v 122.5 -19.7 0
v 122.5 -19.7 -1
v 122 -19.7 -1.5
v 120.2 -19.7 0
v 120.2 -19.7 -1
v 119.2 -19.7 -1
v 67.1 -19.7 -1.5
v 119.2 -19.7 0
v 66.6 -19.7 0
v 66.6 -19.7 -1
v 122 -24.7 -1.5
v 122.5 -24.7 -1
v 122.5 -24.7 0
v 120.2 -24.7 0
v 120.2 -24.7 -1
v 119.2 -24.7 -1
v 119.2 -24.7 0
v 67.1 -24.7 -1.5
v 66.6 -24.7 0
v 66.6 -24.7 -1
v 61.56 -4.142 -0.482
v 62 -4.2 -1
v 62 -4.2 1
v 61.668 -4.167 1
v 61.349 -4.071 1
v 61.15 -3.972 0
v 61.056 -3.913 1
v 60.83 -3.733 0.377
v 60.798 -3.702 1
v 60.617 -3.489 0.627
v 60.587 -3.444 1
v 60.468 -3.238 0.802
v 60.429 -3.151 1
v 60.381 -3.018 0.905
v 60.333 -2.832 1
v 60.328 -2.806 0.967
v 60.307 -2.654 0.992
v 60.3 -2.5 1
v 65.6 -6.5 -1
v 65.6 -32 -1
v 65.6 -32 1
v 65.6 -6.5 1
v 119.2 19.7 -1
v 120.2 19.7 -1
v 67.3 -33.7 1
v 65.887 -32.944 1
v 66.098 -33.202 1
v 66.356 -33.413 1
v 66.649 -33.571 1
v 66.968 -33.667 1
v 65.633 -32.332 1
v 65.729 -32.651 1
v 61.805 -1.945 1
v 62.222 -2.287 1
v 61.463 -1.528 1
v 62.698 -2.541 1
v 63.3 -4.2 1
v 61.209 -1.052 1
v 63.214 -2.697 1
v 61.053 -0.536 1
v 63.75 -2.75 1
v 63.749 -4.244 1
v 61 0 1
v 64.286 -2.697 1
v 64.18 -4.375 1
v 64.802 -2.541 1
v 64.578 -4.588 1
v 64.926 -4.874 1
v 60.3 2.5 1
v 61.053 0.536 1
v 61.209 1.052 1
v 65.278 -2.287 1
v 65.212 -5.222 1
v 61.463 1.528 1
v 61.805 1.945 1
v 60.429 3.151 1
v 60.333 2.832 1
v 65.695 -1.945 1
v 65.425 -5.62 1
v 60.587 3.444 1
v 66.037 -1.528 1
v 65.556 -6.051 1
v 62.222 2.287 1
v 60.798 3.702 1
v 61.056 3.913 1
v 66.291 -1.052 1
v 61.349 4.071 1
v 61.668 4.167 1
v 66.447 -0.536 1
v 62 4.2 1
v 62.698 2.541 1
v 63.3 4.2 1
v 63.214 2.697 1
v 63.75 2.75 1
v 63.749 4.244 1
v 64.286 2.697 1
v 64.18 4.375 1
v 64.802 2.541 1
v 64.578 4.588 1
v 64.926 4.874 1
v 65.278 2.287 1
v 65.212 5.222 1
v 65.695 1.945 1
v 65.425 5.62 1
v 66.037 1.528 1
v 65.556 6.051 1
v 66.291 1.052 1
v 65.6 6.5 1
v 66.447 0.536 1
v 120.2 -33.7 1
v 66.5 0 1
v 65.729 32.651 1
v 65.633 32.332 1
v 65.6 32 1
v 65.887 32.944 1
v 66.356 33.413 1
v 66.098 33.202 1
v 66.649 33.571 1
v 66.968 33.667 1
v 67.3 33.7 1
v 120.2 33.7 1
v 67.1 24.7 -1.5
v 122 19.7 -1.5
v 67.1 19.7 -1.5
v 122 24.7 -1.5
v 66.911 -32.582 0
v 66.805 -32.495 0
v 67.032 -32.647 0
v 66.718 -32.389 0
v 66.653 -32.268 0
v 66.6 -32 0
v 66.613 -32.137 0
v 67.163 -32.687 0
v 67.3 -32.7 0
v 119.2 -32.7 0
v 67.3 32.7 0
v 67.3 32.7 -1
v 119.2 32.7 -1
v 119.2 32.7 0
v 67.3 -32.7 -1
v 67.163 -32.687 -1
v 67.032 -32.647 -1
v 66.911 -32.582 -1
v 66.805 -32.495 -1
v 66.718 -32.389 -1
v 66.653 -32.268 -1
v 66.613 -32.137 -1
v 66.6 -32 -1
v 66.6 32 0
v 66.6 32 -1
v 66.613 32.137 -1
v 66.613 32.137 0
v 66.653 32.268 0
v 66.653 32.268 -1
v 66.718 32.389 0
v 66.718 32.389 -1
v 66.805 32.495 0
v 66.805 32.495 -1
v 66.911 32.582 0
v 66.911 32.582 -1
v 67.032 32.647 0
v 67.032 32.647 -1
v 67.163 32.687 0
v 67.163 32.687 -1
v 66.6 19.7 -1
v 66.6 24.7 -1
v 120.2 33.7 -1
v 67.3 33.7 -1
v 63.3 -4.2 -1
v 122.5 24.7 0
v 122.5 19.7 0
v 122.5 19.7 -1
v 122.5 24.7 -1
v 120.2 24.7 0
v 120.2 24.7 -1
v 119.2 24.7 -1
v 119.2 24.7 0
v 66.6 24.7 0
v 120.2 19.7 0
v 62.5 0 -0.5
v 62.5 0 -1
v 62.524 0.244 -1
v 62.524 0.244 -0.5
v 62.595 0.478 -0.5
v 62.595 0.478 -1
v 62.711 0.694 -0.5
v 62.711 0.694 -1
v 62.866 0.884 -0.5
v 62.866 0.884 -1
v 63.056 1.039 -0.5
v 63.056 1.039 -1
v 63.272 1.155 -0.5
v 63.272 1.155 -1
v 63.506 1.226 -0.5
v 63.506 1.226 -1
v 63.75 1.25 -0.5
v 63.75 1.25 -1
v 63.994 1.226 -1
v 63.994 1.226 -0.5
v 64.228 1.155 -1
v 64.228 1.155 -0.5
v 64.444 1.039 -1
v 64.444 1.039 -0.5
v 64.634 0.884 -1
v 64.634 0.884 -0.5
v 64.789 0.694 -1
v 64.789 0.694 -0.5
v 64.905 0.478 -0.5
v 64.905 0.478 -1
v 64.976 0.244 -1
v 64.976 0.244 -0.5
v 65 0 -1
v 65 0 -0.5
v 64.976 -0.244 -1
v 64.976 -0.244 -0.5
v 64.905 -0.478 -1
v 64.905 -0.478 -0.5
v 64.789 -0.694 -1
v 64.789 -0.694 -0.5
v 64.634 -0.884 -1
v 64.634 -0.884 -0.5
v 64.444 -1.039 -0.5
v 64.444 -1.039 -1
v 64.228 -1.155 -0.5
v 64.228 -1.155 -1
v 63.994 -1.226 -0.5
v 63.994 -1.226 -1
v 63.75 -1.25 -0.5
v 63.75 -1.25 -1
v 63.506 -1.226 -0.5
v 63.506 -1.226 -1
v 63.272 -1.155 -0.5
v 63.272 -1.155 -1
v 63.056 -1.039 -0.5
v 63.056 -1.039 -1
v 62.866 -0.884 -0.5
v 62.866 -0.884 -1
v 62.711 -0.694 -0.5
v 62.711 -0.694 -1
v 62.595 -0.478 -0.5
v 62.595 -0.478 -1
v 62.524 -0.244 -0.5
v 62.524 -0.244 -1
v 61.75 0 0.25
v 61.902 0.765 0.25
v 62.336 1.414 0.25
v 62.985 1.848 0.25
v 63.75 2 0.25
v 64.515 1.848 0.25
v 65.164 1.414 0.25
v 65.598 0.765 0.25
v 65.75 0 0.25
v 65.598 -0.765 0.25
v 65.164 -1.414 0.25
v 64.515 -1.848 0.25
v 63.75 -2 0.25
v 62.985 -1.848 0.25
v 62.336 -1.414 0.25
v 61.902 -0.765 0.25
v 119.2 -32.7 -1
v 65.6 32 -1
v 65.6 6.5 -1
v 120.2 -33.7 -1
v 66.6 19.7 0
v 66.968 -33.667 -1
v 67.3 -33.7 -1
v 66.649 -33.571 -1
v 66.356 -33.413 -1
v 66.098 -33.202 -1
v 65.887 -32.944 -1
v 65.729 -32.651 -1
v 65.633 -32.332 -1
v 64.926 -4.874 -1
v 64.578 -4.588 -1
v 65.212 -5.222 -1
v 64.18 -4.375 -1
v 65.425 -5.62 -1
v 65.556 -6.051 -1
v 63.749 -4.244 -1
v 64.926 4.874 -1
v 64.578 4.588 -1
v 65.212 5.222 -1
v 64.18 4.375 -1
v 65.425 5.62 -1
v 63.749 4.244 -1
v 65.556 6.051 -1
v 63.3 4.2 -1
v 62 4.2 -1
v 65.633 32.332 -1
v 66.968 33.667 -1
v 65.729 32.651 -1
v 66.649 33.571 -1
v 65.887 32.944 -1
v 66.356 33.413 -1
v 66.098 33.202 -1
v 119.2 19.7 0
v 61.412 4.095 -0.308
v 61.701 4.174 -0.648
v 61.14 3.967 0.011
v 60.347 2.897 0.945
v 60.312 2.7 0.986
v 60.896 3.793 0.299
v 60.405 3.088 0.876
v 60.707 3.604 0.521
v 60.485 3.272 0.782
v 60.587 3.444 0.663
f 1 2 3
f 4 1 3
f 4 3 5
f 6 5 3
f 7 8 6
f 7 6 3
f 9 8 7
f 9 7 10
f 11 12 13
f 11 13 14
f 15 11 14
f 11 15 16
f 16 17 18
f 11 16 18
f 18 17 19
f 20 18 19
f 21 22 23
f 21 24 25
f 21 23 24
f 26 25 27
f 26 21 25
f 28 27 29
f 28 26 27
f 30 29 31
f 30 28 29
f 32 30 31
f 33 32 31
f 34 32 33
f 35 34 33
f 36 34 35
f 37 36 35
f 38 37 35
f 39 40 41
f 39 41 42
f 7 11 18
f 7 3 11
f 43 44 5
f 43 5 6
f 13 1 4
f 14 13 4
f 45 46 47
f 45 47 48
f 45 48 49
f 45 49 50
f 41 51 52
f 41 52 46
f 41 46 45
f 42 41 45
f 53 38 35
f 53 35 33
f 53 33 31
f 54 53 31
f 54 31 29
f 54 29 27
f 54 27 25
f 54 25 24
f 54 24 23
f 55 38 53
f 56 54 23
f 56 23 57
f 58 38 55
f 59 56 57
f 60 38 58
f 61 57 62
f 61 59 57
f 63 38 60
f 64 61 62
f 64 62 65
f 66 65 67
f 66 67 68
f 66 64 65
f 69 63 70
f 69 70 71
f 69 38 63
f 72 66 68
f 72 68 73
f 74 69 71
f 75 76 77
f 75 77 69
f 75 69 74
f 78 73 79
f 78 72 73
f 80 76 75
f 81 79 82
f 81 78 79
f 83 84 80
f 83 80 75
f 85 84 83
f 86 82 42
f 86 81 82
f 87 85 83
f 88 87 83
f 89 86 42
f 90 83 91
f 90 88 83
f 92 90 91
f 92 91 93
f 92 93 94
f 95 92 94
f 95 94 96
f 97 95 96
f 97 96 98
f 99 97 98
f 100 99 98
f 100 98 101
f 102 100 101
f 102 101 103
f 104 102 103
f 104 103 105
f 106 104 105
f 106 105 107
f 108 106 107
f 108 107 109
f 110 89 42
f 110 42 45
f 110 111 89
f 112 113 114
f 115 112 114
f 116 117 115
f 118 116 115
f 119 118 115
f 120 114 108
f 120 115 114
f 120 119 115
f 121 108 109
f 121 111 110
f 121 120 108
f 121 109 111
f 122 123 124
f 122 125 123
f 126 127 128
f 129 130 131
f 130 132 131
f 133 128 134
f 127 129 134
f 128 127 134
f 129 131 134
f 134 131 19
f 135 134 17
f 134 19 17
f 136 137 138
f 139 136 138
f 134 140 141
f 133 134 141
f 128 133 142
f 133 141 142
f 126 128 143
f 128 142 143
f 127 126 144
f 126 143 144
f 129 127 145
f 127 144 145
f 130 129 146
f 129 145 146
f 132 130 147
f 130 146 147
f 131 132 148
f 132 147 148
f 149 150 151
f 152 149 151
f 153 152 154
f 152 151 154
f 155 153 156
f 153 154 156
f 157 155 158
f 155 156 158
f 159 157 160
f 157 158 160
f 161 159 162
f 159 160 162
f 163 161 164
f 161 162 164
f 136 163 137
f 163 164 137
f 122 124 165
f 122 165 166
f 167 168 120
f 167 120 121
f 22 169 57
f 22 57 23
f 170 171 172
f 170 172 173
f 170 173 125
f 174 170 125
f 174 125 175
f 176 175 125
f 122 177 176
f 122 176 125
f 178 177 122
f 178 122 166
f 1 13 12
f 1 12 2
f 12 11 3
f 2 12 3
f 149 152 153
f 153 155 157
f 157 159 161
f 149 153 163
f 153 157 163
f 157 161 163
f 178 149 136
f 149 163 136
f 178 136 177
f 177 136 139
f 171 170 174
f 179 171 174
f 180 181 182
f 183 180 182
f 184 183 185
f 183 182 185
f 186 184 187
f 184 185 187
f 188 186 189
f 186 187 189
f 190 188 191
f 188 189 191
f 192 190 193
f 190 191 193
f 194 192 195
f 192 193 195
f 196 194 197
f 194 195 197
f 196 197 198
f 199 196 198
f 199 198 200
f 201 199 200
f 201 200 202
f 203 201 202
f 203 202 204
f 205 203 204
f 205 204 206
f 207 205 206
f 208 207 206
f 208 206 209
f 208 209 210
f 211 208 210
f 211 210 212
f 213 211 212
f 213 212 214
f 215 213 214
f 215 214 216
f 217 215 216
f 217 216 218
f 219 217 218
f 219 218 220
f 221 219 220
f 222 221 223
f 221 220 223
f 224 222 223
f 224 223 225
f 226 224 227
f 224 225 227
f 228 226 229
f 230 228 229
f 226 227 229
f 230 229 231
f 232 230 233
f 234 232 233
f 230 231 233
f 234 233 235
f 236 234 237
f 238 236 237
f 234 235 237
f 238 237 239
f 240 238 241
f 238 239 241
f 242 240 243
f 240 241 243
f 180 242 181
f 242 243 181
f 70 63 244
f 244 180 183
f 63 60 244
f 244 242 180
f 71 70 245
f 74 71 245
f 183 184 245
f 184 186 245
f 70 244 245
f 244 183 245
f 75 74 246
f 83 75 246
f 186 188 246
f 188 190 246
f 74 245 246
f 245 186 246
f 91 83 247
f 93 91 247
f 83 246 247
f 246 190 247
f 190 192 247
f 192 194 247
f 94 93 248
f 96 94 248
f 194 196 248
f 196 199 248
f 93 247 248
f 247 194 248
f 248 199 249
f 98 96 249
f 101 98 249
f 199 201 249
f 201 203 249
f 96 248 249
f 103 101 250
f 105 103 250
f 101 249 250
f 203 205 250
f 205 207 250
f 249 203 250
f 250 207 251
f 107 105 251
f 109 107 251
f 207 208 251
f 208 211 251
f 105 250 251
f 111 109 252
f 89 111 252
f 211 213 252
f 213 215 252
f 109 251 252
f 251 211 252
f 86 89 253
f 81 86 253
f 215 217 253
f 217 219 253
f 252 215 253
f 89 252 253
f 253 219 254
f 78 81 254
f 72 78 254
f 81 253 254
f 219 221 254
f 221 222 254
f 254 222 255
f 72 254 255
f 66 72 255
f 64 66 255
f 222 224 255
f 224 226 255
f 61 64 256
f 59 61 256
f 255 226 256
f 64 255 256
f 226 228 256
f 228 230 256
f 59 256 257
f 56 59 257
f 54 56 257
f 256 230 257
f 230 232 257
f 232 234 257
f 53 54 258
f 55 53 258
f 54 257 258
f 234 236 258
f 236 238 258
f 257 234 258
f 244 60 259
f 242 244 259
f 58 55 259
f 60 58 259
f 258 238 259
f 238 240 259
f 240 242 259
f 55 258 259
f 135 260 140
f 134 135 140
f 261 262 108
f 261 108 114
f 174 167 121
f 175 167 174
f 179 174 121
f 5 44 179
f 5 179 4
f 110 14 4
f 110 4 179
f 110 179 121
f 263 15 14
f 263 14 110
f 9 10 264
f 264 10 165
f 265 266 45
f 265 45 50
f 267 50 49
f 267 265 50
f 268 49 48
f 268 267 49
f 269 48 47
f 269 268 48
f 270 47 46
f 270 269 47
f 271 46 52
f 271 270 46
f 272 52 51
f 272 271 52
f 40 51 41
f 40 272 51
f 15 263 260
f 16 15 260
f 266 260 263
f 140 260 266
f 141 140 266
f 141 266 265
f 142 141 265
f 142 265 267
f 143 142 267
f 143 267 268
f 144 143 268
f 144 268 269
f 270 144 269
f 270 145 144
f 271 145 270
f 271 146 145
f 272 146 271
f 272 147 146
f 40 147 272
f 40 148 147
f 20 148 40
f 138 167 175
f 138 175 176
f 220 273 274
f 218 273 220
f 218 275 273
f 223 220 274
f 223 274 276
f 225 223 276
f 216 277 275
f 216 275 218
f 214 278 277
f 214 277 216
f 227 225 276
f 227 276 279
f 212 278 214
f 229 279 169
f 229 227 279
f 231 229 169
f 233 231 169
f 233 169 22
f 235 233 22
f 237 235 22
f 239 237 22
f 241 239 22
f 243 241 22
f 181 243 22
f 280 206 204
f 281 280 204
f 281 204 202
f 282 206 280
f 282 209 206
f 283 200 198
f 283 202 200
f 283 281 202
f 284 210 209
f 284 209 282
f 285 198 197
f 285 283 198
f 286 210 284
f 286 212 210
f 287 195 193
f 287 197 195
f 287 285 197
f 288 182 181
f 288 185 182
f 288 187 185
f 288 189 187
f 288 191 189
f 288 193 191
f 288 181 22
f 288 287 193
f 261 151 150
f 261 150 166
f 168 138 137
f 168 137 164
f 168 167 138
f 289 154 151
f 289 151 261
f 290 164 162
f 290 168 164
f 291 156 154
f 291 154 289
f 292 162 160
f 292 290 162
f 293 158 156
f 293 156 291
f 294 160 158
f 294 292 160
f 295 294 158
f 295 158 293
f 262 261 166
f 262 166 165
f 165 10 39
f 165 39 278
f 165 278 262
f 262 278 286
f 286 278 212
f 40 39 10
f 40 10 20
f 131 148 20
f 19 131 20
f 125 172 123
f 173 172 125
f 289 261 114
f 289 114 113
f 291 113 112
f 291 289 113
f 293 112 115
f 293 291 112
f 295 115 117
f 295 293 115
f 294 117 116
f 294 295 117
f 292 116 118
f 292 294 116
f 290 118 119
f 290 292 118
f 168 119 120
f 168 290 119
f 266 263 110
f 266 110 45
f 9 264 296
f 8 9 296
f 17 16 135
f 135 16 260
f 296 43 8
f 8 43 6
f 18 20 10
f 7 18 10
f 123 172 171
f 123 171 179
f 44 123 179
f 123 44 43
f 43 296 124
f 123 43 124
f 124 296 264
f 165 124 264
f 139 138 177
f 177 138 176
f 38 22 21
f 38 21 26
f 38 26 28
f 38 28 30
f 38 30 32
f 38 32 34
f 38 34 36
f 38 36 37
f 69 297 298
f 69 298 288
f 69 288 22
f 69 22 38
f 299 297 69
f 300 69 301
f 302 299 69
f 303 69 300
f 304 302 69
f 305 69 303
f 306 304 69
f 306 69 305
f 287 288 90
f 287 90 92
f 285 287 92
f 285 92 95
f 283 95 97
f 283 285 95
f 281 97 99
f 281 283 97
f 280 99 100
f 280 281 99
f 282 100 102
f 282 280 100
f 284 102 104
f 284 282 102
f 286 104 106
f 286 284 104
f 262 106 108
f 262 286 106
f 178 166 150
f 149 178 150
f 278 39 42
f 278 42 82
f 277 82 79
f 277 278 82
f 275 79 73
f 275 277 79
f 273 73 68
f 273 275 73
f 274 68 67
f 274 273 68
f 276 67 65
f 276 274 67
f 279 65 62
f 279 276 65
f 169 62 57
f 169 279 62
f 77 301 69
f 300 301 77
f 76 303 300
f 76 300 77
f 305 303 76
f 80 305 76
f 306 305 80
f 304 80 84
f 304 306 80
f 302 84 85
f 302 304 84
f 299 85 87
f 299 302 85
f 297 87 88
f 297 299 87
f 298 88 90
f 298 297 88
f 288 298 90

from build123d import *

# Parameters (mm, degrees)
BOSS_EXTRUDE1_DEPTH = 1
BOSS_EXTRUDE2_START = 1
BOSS_EXTRUDE2_DEPTH = 1
CUT_EXTRUDE1_REACH  = 128.037
CUT_EXTRUDE2_REACH  = 126.851
SKETCH4_R           = 1.25
CHAMFER1_SIZE       = 1.5
SKETCH5_W           = 55.9
SKETCH5_H           = 5
BOSS_EXTRUDE3_DEPTH = 1.5
CHAMFER3_SIZE       = 0.5


with BuildPart() as part:
    # Sketch1 → Boss-Extrude1 (new body)
    with BuildSketch(Plane.XY):
        with BuildLine():
            Line((67.3, -33.7), (112.5, -33.7))
            Line((112.5, -33.7), (120.2, -33.7))
            Line((120.2, -33.7), (120.2, 33.7))
            Line((120.2, 33.7), (112.5, 33.7))
            Line((112.5, 33.7), (67.3, 33.7))
            ThreePointArc((67.3, 33.7), (66.097918472, 33.202081528), (65.6, 32))
            Line((65.6, 32), (65.6, 6.5))
            ThreePointArc((65.6, 6.5), (64.926345597, 4.873654403), (63.3, 4.2))
            Line((63.3, 4.2), (62, 4.2))
            ThreePointArc((62, 4.2), (60.797918472, 3.702081528), (60.3, 2.5))
            Line((60.3, 2.5), (60.3, -2.5))
            ThreePointArc((60.3, -2.5), (60.797918472, -3.702081528), (62, -4.2))
            Line((62, -4.2), (63.3, -4.2))
            ThreePointArc((63.3, -4.2), (64.926345597, -4.873654403), (65.6, -6.5))
            Line((65.6, -6.5), (65.6, -32))
            ThreePointArc((65.6, -32), (66.097918472, -33.202081528), (67.3, -33.7))
        make_face()
    extrude(amount=BOSS_EXTRUDE1_DEPTH)

    # Sketch2 → Boss-Extrude2 (add)
    with BuildSketch(Plane(origin=(0, 0, 0), x_dir=(-1, 0, 0), z_dir=(0, 0, -1)).offset(BOSS_EXTRUDE2_START)):
        with BuildLine():
            Line((-67.3, 33.7), (-120.2, 33.7))
            Line((-120.2, 33.7), (-120.2, -33.7))
            Line((-120.2, -33.7), (-67.3, -33.7))
            ThreePointArc((-67.3, -33.7), (-66.097918472, -33.202081528), (-65.6, -32))
            Line((-65.6, -32), (-65.6, -6.5))
            ThreePointArc((-65.6, -6.5), (-64.926345597, -4.873654403), (-63.3, -4.2))
            Line((-63.3, -4.2), (-62, -4.2))
            ThreePointArc((-62, -4.2), (-60.797918472, -3.702081528), (-60.3, -2.5))
            Line((-60.3, -2.5), (-60.3, 2.5))
            ThreePointArc((-60.3, 2.5), (-60.797918472, 3.702081528), (-62, 4.2))
            Line((-62, 4.2), (-63.3, 4.2))
            ThreePointArc((-63.3, 4.2), (-64.926345597, 4.873654403), (-65.6, 6.5))
            Line((-65.6, 6.5), (-65.6, 32))
            ThreePointArc((-65.6, 32), (-66.097918472, 33.202081528), (-67.3, 33.7))
        make_face()
        with BuildLine():
            Line((-67.3, 32.7), (-119.2, 32.7))
            Line((-119.2, 32.7), (-119.2, -32.7))
            Line((-119.2, -32.7), (-67.3, -32.7))
            ThreePointArc((-67.3, -32.7), (-66.805025253, -32.494974747), (-66.6, -32))
            Line((-66.6, -32), (-66.6, -6.5))
            Line((-66.6, -6.5), (-66.6, 6.5))
            Line((-66.6, 6.5), (-66.6, 32))
            ThreePointArc((-66.6, 32), (-66.805025253, 32.494974747), (-67.3, 32.7))
        make_face(mode=Mode.SUBTRACT)
    extrude(amount=-BOSS_EXTRUDE2_DEPTH)

    # Cut-Extrude1: up to this face of the body (flat: up to its plane)
    cut_extrude1_end = Plane(part.part.faces().sort_by_distance((62.65, -4.2, 0))[0])
    # Sketch3 → Cut-Extrude1 (cut, up to the picked face)
    with BuildSketch(Plane(origin=(0, 4.2, 0), x_dir=(1, 0, 0), z_dir=(0, 1, 0)), mode=Mode.PRIVATE) as cut_extrude1_sk1:
        Polygon((62, 1), (60.3, -1), (60.3, 1), align=None)
    cut_extrude1_tool1 = split(extrude(cut_extrude1_sk1.sketch, amount=-CUT_EXTRUDE1_REACH, mode=Mode.PRIVATE), bisect_by=cut_extrude1_end, keep=Keep.BOTH, mode=Mode.PRIVATE)
    add(cut_extrude1_tool1.solids().sort_by(Axis((60.866667, 4.2, -0.333333), (0, -1, 0)))[0], mode=Mode.SUBTRACT)

    # Sketch4 → Cut-Extrude2 (cut, up to next)
    with BuildSketch(Plane(origin=(0, 0, -1), x_dir=(-1, 0, 0), z_dir=(0, 0, -1)), mode=Mode.PRIVATE) as cut_extrude2_sk1:
        with Locations((-63.75, 0)):
            Circle(SKETCH4_R)
    cut_extrude2_tool1 = extrude(cut_extrude2_sk1.sketch, amount=-CUT_EXTRUDE2_REACH, mode=Mode.PRIVATE) & part.part
    add(cut_extrude2_tool1.solids().sort_by_distance((63.75, 0, -1))[0], mode=Mode.SUBTRACT)

    # Chamfer1
    chamfer1_edges = [part.edges().sort_by_distance(p)[0] for p in [
        (65, 0, 1),
    ]]
    chamfer(chamfer1_edges, length=CHAMFER1_SIZE)

    # Sketch5 → Boss-Extrude3 (add)
    with BuildSketch(Plane(origin=(0, 0, 0), x_dir=(-1, 0, 0), z_dir=(0, 0, -1))):
        with Locations((-94.55, -22.2)):
            Rectangle(SKETCH5_W, SKETCH5_H)
        with Locations((-94.55, 22.2)):
            Rectangle(SKETCH5_W, SKETCH5_H)
    extrude(amount=BOSS_EXTRUDE3_DEPTH)

    # Chamfer3
    chamfer3_edges = [part.edges().sort_by_distance(p)[0] for p in [
        (122.5, 22.2, -1.5),
        (122.5, -22.2, -1.5),
        (66.6, -22.2, -1.5),
        (66.6, 22.2, -1.5),
    ]]
    chamfer(chamfer3_edges, length=CHAMFER3_SIZE - 0.0001)  # a hair under: the kernel refuses the full size


solid = part.part
